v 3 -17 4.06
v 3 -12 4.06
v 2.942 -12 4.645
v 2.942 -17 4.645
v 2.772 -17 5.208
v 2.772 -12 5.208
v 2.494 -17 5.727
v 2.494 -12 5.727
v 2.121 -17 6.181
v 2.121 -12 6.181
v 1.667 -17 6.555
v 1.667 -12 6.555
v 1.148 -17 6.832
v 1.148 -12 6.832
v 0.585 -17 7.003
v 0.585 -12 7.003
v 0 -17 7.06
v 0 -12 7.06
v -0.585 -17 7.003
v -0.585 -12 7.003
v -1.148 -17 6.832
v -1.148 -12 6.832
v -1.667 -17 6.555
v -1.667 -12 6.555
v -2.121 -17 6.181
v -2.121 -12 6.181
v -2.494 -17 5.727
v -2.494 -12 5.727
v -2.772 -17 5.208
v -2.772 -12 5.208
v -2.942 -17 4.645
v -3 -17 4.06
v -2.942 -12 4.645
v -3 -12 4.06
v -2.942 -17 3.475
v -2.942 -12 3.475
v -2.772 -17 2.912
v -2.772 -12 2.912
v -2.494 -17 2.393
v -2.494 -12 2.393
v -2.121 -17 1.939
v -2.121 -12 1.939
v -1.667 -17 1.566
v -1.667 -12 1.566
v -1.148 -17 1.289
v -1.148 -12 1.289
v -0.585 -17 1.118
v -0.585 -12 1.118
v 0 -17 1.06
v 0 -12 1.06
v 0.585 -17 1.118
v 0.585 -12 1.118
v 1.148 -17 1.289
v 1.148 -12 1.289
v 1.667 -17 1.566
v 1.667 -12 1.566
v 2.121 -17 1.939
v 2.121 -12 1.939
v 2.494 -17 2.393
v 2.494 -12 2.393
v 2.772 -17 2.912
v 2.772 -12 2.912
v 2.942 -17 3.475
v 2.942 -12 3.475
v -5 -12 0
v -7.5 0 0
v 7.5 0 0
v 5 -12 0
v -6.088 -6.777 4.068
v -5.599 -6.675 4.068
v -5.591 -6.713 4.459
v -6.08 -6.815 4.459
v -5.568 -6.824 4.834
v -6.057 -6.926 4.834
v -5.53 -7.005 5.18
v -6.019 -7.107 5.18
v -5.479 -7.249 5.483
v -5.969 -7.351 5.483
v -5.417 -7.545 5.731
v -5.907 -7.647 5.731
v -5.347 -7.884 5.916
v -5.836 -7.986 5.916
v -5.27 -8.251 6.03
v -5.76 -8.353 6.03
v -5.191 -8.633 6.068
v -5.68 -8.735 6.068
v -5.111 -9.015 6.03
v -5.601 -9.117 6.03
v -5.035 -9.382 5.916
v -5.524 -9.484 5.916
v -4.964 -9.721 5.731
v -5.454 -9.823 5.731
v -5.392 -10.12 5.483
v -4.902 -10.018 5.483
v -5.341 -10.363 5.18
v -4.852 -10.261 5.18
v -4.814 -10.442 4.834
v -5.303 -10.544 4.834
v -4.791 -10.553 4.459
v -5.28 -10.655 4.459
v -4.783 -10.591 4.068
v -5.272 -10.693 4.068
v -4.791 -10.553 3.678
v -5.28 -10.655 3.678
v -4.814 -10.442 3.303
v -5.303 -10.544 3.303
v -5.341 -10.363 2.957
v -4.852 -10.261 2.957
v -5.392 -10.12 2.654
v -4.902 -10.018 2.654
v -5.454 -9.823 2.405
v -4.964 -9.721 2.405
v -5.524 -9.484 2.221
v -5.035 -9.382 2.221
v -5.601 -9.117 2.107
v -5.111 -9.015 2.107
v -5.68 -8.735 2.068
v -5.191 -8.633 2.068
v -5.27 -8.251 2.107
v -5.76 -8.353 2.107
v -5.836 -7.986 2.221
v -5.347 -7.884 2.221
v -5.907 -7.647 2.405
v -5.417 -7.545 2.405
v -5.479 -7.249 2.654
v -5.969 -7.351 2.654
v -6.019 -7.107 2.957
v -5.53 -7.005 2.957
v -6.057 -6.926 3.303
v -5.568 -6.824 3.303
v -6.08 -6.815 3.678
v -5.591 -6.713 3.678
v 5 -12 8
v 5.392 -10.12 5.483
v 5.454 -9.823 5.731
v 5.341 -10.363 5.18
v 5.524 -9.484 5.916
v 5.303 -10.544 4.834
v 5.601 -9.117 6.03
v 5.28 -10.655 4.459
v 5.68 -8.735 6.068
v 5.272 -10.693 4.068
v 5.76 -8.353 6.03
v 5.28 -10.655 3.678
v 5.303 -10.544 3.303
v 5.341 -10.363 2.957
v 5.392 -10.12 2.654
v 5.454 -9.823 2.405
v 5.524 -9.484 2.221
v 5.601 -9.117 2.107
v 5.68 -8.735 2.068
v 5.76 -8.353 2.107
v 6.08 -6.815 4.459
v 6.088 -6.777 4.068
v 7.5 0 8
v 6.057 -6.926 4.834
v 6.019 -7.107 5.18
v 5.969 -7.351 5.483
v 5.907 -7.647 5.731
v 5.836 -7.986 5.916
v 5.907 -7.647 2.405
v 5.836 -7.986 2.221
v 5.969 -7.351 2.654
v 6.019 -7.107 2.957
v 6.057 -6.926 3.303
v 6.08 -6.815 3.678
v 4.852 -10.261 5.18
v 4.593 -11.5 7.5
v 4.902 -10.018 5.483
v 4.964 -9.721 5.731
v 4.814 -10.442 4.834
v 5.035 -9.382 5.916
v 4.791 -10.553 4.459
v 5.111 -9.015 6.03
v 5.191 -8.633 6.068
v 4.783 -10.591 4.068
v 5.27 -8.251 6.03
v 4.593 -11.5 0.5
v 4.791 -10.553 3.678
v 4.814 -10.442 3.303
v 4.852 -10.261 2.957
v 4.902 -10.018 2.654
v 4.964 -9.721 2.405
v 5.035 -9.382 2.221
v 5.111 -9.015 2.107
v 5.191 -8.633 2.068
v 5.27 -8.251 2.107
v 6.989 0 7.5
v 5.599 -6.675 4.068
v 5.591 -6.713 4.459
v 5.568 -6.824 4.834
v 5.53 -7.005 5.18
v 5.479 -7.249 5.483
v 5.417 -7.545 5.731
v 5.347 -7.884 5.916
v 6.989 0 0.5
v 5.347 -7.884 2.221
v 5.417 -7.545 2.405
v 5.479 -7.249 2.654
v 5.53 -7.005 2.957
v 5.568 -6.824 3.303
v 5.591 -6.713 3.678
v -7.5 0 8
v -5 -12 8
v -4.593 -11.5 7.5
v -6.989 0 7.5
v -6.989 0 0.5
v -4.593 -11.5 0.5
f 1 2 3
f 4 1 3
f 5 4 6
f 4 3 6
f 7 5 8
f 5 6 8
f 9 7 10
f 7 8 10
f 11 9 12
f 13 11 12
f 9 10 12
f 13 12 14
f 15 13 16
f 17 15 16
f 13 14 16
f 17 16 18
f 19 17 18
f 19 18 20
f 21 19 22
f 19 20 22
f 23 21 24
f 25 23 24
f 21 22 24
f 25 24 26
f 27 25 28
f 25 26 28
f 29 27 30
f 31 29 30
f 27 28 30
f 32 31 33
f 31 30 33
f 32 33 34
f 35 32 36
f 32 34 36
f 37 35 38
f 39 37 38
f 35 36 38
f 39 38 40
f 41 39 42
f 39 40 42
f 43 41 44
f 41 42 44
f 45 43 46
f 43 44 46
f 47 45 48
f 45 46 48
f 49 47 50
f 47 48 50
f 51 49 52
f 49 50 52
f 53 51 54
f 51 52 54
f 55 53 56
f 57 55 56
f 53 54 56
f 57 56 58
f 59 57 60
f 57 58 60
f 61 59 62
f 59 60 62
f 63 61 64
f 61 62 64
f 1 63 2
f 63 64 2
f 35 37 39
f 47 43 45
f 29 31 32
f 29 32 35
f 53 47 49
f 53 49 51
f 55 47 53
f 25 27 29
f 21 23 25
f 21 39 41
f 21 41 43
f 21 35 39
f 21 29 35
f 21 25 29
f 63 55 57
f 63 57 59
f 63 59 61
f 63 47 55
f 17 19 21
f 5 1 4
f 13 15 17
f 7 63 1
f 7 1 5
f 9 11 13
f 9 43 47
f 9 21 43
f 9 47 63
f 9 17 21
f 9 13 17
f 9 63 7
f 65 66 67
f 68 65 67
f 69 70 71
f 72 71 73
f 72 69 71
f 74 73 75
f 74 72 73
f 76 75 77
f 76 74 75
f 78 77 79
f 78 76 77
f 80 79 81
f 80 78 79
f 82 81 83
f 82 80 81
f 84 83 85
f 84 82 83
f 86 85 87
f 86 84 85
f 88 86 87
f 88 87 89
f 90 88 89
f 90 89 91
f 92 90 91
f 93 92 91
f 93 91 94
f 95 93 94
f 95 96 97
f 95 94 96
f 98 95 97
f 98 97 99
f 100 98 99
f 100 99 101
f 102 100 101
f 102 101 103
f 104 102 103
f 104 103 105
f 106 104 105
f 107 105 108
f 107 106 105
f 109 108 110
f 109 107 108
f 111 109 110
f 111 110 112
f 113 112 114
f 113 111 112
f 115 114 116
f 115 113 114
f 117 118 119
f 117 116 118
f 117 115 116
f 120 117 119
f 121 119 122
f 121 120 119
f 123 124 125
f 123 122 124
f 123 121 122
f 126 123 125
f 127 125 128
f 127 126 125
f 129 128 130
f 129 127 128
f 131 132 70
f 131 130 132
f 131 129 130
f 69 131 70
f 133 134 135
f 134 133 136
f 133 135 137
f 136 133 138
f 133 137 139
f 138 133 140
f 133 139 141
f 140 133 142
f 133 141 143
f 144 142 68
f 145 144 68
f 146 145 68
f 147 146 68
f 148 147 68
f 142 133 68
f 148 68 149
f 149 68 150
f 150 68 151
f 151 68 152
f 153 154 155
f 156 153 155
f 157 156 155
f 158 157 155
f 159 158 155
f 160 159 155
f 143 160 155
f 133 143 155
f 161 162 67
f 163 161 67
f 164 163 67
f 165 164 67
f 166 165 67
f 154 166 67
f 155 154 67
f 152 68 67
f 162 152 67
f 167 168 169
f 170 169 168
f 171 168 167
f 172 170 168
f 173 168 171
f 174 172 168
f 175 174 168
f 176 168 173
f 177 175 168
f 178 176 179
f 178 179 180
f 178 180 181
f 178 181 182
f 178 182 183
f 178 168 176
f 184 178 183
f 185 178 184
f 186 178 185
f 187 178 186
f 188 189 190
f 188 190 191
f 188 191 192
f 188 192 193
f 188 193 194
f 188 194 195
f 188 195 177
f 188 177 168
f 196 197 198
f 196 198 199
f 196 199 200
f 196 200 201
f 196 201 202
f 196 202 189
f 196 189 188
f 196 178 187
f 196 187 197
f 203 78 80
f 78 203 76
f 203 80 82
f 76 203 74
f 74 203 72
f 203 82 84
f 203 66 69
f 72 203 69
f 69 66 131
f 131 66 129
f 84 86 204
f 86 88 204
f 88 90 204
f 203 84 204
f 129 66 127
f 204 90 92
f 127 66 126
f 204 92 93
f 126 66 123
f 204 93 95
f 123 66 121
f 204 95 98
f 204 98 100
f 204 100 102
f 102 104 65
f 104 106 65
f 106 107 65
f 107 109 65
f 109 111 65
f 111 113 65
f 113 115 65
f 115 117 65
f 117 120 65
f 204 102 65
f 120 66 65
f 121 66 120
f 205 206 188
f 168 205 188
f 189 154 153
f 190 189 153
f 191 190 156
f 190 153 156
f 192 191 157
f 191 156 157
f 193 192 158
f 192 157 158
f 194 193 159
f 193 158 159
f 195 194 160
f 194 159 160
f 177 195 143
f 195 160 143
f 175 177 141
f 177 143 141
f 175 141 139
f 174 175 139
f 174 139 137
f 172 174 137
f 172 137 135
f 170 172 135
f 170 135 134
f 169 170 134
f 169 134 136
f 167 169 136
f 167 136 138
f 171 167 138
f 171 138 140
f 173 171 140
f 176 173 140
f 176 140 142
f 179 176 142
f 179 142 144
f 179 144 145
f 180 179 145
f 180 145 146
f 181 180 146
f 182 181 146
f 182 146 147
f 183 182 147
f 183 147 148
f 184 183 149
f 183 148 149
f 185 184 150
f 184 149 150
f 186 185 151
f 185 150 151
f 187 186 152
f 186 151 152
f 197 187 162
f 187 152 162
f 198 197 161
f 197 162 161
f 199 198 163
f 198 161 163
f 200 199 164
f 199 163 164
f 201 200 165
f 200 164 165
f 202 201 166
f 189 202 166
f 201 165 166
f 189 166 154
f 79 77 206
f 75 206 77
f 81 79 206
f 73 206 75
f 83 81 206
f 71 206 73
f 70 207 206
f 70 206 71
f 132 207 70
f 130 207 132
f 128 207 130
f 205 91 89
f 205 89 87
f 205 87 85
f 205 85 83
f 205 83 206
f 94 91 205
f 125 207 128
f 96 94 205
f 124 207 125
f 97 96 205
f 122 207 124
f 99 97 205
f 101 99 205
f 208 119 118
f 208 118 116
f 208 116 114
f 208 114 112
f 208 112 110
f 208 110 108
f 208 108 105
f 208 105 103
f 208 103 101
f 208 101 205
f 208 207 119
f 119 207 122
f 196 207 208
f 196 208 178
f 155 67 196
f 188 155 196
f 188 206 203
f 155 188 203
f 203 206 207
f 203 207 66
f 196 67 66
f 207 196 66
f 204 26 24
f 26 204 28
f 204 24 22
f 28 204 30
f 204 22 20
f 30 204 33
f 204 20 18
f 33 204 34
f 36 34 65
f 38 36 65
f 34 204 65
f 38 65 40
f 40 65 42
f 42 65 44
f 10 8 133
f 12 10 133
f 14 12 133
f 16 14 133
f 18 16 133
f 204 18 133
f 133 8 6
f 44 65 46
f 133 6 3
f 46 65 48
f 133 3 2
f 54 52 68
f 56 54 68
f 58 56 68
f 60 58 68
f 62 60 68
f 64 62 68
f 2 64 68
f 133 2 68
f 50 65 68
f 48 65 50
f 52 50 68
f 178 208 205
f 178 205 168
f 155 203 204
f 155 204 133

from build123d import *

# Parameters (mm, degrees)
F1_DEPTH = 8
F2_T     = -0.5
F3_R     = 3
F4_DEPTH = 5
F5_R     = 2
F6_DEPTH = 5


# Not quite as in the source:
# - a pattern or mirror of a feature is missing from the dataset's text; its kind, count and spacing are read off the source's solid


with BuildPart() as f1:
    # F0 (on Top) → F1 (new body)
    with BuildSketch(Plane.XY):
        Polygon((-7.5, 0), (-5, -12), (5, -12), (7.5, 0), align=None)
    extrude(amount=F1_DEPTH)

    # F2
    f2_openings = [f1.faces().sort_by_distance(p)[0] for p in [
        (0, 0, 4),
    ]]
    offset(amount=F2_T, openings=f2_openings)

    # F3 (on face) → F4 (join)
    with BuildSketch(Plane.XZ.offset(12)):
        with Locations((0, 4.0601608343)):
            Circle(F3_R)
    extrude(amount=F4_DEPTH)

    # F5 (on face) → F6 (cut)
    with BuildSketch(Plane(origin=(7.1880199667, -1.4975041597, 0), x_dir=(0.2039542541, 0.9789804197, 0), z_dir=(0.9789804197, -0.2039542541, 0))):
        with Locations((-7.3930048384, 4.0684221312)):
            Circle(F5_R)
    f6 = extrude(amount=-F6_DEPTH, mode=Mode.SUBTRACT)

    # F6_copies: F6 across plane
    add(f6.mirror(Plane(origin=(0, 0, 0), x_dir=(0, 0, -1), z_dir=(-1, 0, 0))), mode=Mode.SUBTRACT)


solid = f1.part
